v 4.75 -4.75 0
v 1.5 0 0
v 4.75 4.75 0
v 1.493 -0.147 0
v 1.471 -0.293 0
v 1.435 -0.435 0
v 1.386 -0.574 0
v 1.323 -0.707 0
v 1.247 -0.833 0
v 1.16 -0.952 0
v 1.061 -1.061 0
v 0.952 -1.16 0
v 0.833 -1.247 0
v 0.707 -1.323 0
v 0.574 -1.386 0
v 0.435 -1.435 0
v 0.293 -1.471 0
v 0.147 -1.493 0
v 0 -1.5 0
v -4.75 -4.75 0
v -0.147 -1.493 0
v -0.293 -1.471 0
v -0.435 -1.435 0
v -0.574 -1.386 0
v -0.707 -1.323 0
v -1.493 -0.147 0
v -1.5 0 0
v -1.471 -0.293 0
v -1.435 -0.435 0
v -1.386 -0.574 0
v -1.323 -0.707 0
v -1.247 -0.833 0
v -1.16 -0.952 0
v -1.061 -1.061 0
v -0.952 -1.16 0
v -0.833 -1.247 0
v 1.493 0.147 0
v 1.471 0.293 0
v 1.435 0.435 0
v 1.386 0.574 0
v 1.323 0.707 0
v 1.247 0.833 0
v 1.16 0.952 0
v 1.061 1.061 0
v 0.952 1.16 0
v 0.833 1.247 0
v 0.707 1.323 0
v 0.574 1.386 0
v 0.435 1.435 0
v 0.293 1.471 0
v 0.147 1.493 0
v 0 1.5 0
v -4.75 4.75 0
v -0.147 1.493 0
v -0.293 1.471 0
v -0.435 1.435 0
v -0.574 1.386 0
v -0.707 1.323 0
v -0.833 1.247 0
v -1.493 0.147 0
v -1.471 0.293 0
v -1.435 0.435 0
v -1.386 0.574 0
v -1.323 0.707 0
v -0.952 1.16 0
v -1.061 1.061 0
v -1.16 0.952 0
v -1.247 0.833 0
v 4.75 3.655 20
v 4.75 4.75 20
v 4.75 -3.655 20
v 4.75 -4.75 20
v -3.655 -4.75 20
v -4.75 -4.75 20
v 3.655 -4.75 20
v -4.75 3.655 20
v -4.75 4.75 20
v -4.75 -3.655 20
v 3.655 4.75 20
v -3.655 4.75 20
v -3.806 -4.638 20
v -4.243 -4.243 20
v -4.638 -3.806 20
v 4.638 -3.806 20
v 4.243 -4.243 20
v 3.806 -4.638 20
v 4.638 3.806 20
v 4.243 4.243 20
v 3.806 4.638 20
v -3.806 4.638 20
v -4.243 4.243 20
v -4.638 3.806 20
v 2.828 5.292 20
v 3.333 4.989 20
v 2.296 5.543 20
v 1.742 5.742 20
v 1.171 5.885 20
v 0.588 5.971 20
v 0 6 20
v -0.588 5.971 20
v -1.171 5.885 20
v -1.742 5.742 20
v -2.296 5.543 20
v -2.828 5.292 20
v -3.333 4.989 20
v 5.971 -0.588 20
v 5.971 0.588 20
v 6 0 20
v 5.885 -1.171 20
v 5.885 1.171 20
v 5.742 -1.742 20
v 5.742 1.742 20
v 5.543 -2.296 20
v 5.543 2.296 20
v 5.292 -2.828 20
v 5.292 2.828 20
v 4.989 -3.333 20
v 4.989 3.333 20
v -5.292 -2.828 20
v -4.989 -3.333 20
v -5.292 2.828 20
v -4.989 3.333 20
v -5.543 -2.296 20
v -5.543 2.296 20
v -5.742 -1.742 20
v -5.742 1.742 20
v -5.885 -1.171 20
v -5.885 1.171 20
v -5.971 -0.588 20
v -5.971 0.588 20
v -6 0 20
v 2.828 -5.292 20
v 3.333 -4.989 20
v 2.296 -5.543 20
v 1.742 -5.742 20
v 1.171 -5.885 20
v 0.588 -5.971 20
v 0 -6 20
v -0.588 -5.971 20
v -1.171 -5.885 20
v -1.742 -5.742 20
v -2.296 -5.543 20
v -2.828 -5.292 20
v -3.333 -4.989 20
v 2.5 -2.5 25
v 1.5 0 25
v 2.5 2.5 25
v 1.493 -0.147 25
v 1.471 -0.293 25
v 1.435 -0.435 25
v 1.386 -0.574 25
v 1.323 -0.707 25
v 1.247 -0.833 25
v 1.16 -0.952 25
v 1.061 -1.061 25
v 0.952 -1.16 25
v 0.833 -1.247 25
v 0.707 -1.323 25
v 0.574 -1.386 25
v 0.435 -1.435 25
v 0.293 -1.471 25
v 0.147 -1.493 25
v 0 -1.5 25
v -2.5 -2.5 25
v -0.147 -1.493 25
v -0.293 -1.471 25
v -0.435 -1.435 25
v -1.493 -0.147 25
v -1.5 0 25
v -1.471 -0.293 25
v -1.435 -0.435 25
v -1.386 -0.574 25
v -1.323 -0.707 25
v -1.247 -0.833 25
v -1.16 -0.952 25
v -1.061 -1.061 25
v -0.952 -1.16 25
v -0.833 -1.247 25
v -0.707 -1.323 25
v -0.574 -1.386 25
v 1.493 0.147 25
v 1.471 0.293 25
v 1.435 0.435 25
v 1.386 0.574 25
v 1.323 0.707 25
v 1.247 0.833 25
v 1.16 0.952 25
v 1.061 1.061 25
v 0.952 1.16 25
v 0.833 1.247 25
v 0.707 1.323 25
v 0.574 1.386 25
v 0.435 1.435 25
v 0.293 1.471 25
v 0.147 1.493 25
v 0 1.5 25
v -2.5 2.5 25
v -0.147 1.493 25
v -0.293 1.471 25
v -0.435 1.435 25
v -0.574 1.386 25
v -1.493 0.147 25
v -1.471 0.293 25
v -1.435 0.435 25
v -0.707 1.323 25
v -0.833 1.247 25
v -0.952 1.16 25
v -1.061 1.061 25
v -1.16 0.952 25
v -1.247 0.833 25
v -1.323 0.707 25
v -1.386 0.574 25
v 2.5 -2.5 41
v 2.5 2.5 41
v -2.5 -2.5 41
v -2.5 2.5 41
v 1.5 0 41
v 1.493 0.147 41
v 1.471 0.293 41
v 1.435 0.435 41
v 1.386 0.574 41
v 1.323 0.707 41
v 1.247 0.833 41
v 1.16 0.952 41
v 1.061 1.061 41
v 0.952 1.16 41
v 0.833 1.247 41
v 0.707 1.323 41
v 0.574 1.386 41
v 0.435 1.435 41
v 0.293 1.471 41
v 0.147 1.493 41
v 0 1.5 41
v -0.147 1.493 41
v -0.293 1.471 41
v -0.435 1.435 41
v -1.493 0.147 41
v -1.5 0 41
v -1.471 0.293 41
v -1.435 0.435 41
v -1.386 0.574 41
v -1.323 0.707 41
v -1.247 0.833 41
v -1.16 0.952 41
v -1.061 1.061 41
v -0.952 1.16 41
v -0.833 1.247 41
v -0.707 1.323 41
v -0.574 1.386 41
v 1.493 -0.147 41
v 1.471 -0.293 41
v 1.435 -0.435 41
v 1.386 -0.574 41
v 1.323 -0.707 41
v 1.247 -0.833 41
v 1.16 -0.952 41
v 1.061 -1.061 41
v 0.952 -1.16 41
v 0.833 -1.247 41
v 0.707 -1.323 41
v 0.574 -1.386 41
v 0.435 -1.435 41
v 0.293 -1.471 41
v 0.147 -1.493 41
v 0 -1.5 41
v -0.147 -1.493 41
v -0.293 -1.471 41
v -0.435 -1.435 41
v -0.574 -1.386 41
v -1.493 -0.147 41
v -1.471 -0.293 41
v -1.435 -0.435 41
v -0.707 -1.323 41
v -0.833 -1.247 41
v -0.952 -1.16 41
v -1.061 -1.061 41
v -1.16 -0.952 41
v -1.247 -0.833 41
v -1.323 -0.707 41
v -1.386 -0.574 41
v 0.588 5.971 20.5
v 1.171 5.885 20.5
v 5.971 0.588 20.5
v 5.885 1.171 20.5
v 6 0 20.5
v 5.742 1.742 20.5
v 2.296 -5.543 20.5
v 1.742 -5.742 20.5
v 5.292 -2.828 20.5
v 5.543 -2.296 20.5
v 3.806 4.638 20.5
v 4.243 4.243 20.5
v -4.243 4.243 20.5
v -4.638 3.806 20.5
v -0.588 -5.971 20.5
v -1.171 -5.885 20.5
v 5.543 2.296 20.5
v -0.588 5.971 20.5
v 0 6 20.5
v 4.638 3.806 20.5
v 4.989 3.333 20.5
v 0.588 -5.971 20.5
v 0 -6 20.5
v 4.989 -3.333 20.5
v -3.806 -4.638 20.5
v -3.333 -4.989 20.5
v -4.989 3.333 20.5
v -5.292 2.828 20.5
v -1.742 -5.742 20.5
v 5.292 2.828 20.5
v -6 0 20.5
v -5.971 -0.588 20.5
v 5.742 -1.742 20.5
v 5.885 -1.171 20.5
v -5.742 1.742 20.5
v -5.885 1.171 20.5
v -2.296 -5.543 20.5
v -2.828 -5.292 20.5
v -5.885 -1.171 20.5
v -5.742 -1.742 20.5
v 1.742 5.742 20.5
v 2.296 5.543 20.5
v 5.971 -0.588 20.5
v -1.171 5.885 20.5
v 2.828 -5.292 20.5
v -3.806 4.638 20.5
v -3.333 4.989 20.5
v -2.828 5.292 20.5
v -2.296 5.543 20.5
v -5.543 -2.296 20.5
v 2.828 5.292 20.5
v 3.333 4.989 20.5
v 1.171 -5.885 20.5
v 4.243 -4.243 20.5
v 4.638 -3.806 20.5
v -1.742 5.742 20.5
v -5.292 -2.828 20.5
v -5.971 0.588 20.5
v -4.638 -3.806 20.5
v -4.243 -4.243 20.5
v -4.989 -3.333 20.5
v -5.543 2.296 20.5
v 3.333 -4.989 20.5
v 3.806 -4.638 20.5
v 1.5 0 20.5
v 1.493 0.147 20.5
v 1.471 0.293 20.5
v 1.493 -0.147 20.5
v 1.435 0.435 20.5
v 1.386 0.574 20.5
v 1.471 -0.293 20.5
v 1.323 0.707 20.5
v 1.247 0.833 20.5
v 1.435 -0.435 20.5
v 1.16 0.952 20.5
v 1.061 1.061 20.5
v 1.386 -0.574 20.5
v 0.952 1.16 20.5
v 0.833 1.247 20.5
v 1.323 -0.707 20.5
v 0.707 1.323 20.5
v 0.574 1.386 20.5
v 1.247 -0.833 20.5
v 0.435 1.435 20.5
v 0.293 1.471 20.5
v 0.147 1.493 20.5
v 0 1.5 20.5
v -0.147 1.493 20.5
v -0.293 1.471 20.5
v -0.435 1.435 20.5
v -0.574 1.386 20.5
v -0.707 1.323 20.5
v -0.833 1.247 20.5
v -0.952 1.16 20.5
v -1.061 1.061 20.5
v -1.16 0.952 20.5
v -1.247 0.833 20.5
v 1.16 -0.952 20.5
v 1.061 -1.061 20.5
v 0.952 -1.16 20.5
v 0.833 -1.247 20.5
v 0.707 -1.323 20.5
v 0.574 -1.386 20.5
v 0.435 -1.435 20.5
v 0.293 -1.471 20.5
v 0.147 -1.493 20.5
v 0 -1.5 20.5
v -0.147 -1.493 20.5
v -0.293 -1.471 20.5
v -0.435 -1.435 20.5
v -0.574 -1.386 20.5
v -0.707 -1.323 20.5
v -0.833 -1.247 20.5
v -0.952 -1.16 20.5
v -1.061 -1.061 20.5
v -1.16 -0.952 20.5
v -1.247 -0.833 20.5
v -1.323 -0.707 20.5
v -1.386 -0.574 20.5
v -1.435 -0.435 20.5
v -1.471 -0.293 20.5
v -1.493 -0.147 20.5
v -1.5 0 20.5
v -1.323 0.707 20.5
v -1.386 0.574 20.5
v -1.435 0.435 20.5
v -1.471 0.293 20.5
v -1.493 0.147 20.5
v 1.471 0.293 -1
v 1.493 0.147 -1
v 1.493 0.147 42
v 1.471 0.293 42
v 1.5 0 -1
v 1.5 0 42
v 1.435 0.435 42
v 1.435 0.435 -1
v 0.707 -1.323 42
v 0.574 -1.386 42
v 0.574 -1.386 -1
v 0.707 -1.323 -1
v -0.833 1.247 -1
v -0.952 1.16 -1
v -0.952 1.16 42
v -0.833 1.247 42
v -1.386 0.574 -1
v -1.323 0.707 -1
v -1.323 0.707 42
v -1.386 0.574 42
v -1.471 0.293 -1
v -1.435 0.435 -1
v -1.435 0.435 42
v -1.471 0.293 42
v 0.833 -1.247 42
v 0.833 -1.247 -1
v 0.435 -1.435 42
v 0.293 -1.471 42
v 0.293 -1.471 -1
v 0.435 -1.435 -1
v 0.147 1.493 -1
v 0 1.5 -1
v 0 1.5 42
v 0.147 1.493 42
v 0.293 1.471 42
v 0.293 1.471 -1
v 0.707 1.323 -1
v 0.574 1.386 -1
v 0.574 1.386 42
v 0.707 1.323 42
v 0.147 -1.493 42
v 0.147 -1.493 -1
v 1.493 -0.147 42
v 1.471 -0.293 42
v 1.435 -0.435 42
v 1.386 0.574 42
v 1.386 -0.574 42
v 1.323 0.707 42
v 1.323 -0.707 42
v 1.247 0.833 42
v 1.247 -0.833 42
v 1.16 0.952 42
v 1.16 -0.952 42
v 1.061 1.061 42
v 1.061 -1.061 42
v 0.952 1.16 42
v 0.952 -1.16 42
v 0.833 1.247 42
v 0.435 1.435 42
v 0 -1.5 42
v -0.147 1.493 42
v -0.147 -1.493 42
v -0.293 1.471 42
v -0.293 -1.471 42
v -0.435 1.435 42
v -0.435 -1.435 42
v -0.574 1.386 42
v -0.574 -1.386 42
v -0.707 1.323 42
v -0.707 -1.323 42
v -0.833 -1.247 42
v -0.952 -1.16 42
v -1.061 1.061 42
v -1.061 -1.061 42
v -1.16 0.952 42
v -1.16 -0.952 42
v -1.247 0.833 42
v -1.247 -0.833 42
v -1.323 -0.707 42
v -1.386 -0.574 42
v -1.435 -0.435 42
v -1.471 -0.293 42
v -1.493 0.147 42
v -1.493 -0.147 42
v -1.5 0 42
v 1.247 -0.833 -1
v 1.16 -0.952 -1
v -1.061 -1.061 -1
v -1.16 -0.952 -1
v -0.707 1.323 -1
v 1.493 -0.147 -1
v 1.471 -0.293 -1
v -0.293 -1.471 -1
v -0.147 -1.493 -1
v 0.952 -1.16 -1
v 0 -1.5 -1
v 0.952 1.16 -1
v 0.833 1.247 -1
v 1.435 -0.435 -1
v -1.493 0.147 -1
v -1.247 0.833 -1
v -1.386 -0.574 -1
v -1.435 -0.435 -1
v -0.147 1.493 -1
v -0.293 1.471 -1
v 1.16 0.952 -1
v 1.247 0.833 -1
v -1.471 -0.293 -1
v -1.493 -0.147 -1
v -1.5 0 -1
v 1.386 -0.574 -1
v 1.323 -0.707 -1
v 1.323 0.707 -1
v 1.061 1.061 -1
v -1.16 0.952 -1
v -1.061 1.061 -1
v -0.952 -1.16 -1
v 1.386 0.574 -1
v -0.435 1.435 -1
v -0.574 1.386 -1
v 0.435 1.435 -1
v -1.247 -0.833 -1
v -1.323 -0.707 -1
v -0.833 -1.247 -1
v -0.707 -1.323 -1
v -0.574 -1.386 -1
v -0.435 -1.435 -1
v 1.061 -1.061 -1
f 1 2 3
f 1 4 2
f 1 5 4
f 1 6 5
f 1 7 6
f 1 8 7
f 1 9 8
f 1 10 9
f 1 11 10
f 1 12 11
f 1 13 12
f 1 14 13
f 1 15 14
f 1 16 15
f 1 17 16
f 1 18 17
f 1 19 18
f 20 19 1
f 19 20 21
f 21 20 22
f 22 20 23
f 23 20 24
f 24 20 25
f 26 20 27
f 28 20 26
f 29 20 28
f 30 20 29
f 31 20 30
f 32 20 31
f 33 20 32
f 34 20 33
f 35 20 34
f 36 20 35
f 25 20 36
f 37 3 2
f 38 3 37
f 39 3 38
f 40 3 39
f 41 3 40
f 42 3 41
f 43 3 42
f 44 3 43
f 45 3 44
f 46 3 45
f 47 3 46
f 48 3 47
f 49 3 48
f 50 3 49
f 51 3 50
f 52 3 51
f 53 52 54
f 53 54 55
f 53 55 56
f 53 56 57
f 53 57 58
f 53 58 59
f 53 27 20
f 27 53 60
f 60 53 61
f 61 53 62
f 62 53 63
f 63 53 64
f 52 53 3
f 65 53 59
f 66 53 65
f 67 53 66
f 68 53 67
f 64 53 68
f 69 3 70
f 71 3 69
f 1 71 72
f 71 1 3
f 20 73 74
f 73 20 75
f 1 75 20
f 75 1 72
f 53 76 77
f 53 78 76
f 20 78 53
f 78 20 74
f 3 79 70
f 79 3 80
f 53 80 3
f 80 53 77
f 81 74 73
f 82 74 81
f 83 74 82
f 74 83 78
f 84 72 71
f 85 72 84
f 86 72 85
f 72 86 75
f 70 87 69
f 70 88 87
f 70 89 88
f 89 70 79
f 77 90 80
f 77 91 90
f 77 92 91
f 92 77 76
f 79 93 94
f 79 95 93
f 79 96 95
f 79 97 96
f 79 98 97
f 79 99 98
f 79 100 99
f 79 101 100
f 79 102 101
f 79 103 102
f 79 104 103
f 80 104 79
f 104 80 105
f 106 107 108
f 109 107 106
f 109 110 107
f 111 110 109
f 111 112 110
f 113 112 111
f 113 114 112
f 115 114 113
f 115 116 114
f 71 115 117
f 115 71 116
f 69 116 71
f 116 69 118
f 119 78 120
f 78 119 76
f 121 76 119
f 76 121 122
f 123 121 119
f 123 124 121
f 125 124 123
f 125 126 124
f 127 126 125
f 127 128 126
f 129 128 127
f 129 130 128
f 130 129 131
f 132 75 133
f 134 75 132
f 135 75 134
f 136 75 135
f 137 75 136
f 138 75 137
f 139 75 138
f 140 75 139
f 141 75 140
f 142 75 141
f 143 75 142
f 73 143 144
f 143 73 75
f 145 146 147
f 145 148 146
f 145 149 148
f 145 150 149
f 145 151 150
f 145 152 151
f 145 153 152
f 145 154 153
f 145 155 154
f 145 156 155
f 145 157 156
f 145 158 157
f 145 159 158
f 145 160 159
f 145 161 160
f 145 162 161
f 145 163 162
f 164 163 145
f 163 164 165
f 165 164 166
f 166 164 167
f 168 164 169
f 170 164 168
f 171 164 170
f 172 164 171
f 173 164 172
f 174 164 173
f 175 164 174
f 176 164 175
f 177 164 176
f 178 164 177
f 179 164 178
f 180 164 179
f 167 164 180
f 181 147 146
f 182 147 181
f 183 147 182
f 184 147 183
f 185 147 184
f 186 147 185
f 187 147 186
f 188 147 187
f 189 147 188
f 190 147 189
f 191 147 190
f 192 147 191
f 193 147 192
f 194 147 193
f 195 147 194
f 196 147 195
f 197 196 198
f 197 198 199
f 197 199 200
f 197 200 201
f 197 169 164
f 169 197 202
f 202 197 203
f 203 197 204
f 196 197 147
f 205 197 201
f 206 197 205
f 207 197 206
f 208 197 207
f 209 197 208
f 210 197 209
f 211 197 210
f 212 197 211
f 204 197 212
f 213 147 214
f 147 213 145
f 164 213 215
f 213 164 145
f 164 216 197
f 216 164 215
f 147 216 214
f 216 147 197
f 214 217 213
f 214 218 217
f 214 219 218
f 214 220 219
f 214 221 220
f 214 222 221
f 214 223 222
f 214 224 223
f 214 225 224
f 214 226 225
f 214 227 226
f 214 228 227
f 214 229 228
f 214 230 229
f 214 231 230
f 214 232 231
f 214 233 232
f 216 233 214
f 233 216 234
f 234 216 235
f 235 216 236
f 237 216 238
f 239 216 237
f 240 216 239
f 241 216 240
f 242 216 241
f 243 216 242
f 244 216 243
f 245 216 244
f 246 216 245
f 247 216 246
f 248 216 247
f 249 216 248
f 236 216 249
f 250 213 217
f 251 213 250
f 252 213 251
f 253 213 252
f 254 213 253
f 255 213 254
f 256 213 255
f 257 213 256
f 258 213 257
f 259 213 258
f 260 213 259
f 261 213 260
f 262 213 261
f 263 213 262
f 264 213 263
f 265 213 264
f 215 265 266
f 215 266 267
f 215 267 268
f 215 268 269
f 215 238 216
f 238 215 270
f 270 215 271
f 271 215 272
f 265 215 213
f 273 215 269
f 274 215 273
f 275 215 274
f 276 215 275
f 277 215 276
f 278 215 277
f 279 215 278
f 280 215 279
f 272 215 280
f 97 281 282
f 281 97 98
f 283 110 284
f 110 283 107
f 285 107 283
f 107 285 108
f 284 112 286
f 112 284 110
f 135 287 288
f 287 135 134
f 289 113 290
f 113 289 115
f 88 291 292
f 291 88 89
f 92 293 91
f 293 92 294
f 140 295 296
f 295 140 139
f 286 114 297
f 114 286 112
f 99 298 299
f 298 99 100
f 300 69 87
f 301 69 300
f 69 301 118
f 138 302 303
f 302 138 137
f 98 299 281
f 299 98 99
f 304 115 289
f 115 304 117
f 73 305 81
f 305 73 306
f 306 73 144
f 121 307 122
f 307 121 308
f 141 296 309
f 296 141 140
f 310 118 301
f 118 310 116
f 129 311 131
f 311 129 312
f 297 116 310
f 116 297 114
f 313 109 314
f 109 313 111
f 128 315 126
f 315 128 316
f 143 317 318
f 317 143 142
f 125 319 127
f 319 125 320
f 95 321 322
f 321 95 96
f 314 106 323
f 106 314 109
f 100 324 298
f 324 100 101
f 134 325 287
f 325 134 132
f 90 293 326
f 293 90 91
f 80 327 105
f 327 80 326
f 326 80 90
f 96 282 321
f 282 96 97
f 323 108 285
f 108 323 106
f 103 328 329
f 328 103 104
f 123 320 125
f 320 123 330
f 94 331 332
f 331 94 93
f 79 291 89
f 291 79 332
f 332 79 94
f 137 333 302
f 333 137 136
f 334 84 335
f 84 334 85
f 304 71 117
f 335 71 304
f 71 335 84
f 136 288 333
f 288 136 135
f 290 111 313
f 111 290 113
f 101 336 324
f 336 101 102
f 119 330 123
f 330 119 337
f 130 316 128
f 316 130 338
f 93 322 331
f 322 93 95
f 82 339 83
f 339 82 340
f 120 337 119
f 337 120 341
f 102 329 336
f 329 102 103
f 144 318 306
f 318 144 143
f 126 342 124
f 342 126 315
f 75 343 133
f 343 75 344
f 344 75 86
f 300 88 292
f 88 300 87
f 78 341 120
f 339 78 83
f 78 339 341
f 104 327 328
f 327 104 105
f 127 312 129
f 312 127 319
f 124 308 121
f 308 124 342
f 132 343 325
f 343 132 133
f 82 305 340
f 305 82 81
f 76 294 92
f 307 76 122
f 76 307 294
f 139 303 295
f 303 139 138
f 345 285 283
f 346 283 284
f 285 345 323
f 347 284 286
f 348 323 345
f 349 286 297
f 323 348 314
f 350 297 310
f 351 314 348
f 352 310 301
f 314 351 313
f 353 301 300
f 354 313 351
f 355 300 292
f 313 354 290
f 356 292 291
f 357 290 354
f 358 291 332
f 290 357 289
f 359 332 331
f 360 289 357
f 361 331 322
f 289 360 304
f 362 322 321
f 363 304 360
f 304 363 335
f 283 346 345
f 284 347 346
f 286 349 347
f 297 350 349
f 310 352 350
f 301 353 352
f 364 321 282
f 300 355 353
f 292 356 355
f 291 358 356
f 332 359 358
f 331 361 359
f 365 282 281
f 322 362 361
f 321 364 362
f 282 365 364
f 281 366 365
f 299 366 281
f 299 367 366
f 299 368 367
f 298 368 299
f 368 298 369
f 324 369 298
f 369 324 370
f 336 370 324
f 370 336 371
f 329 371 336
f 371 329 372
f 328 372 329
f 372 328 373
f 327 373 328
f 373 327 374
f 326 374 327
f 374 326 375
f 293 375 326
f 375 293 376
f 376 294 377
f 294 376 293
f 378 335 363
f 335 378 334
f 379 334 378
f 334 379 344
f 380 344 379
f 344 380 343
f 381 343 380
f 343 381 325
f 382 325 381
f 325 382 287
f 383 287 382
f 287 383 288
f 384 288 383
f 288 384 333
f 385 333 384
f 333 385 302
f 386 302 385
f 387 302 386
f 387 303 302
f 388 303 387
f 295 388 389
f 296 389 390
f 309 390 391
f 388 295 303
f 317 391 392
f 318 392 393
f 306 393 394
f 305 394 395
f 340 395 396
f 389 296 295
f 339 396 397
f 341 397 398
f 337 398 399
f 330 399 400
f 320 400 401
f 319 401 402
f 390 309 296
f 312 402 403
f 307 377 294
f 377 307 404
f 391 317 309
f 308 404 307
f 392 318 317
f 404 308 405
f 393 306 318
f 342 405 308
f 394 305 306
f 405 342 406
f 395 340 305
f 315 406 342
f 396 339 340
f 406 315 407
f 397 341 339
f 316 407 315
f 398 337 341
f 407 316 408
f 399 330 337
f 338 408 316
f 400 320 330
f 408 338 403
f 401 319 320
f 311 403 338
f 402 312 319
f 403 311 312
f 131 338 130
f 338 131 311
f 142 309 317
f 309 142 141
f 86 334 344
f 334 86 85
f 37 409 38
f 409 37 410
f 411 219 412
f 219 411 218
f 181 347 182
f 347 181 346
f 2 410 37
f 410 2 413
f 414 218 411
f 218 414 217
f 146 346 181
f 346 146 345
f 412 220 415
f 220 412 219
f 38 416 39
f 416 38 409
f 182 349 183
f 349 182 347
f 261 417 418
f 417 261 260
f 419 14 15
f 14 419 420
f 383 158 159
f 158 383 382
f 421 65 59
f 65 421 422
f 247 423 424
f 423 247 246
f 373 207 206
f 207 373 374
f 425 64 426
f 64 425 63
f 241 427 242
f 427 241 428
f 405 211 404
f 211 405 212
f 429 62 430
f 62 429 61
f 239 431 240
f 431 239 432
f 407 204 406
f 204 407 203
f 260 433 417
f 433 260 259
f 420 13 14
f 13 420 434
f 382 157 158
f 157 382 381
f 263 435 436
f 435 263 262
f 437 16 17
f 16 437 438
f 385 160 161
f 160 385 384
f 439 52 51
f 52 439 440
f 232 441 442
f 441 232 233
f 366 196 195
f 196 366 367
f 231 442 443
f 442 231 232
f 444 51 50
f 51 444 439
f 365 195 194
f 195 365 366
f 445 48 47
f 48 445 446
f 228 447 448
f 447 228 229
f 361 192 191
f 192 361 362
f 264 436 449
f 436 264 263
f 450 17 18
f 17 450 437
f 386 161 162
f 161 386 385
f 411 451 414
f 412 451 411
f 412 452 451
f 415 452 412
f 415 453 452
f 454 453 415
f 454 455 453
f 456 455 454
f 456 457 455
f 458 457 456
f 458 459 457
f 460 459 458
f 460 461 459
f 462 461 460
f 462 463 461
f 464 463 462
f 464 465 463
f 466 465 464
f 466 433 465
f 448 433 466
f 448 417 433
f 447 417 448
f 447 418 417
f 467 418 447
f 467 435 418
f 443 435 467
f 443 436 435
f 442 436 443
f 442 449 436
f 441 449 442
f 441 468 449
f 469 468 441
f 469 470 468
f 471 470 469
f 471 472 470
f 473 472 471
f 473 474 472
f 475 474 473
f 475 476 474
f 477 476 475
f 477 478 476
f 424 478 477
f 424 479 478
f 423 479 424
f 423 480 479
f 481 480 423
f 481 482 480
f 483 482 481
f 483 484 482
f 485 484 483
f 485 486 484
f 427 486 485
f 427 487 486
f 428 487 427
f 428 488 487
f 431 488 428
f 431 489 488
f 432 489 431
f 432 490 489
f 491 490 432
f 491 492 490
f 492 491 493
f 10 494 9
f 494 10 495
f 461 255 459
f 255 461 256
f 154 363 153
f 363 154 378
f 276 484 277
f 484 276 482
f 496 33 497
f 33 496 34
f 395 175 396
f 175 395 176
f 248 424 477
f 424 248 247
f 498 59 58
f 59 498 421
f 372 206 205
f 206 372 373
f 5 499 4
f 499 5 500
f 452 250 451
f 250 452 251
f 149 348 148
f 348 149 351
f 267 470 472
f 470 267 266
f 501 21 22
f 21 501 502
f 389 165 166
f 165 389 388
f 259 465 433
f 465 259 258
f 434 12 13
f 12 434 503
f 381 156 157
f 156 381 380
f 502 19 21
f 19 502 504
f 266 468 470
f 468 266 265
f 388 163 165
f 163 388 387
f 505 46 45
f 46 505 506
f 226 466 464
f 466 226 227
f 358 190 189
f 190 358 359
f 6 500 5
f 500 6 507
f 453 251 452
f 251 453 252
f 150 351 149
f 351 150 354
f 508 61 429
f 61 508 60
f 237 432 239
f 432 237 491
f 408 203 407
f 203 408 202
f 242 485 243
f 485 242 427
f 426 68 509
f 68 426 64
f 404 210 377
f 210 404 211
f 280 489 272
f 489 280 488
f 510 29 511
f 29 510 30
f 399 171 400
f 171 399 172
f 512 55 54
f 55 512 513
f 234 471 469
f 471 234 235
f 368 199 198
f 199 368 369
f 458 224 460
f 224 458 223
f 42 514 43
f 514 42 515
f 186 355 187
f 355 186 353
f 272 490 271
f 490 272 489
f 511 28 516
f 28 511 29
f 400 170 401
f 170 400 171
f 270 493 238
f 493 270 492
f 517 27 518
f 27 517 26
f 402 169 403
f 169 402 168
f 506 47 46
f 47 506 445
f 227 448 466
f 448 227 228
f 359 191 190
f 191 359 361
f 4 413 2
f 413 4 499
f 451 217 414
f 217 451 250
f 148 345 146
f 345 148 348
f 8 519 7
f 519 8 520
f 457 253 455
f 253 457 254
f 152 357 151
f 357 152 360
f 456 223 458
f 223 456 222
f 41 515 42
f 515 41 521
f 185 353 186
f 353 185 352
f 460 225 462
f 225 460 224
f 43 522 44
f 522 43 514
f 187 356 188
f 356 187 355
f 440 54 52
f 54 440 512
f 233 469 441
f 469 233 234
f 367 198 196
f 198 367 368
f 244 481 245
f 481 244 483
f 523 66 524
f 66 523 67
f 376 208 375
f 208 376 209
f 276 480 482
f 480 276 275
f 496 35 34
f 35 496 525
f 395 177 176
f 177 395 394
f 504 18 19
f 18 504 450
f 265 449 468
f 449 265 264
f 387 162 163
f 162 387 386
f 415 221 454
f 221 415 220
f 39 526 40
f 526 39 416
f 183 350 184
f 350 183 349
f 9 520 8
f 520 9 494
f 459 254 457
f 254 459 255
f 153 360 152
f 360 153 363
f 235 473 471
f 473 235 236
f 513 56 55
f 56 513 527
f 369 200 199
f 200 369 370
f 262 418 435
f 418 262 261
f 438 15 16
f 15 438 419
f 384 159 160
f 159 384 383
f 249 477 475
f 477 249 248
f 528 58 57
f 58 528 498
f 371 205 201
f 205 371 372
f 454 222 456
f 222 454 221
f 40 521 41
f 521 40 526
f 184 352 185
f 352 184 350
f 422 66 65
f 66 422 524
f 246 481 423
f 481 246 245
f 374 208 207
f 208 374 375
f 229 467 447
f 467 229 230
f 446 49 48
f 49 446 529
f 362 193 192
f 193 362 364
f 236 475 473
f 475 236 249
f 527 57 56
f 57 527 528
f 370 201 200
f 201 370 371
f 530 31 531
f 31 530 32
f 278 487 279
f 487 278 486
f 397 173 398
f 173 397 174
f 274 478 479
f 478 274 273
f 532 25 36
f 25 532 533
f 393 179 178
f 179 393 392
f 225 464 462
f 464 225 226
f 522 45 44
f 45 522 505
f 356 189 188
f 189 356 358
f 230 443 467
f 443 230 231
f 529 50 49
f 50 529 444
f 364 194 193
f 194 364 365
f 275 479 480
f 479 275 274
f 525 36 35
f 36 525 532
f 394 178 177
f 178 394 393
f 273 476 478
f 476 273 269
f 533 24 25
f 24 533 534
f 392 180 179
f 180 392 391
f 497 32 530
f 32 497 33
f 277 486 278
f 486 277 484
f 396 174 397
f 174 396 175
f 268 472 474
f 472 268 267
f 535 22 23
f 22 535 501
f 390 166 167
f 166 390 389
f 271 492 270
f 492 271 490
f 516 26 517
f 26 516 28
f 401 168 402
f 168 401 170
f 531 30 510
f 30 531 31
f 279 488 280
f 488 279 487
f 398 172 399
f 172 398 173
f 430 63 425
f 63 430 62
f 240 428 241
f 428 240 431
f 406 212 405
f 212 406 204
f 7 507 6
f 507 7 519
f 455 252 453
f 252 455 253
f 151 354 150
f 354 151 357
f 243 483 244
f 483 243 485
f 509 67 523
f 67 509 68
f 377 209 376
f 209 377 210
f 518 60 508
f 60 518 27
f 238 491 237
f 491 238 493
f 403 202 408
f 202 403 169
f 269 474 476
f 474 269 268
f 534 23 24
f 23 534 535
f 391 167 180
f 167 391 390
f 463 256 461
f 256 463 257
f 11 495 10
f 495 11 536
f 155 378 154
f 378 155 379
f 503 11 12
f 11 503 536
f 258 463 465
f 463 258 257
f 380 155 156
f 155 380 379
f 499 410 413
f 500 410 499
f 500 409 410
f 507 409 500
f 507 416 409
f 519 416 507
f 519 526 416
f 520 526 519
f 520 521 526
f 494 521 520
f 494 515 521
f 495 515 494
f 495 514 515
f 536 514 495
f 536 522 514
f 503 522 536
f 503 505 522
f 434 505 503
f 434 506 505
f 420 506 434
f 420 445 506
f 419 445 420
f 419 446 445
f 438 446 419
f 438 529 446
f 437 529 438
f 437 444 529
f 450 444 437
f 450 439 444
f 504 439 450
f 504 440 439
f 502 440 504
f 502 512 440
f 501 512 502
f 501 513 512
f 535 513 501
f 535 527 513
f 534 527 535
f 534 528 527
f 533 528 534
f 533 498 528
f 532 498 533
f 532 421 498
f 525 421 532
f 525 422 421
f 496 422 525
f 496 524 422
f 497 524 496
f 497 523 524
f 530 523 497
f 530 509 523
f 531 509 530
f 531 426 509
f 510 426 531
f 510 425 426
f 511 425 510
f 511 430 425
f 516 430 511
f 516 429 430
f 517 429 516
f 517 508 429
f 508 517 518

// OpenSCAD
// Hose-barb reducer: 8 mm tubing (z = 0..20) to 5 mm tubing (z = 25..41)
// Print orientation: standing upright along +Z, centred on the Z axis

$fn = 64;

// ---- Dimensions (mm) ----
bore        = 3;    // central through-bore diameter
barb_od_8   = 9.5;  // outer diameter of 8 mm barbs at their tops
barb_h_8    = 10;   // height of each 8 mm barb
barb_start_8 = 7.5; // outer diameter of 8 mm barbs at their bottoms
collar_d    = 12;   // outer diameter of the collar (z = 20..25)
barb_od_5   = 5.0;  // outer diameter of 5 mm barbs at their tops
barb_h_5    = 8;    // height of each 5 mm barb
barb_start_5 = 6.5; // outer diameter of 5 mm barbs at their bottoms
overlap     = 0.5;  // axial overlap so adjacent parts fuse cleanly

// ---- Model ----
union() {
    // 8 mm tubing side (z = 0 to 20), two stacked barbs
    for (i = [0 : 1])
        translate([0, 0, i * barb_h_8])
            linear_extrude(height = barb_h_8)
                polygon([
                    [-barb_od_8 / 2, -barb_od_8 / 2],
                    [ barb_od_8 / 2, -barb_od_8 / 2],
                    [ barb_od_8 / 2,  barb_od_8 / 2],
                    [-barb_od_8 / 2,  barb_od_8 / 2]
                ]);

    // Collar (z = 20 to 25)
    translate([0, 0, 20])
        cylinder(d = collar_d, h = overlap);

    // 5 mm tubing side (z = 25 to 41), two stacked barbs
    for (i = [0 : 1])
        translate([0, 0, 25 + i * barb_h_5])
            linear_extrude(height = barb_h_5)
                polygon([
                    [-barb_od_5 / 2, -barb_od_5 / 2],
                    [ barb_od_5 / 2, -barb_od_5 / 2],
                    [ barb_od_5 / 2,  barb_od_5 / 2],
                    [-barb_od_5 / 2,  barb_od_5 / 2]
                ]);
}

// ---- Through-bore ----
translate([0, 0, -1])
    cylinder(d = bore, h = 43);
